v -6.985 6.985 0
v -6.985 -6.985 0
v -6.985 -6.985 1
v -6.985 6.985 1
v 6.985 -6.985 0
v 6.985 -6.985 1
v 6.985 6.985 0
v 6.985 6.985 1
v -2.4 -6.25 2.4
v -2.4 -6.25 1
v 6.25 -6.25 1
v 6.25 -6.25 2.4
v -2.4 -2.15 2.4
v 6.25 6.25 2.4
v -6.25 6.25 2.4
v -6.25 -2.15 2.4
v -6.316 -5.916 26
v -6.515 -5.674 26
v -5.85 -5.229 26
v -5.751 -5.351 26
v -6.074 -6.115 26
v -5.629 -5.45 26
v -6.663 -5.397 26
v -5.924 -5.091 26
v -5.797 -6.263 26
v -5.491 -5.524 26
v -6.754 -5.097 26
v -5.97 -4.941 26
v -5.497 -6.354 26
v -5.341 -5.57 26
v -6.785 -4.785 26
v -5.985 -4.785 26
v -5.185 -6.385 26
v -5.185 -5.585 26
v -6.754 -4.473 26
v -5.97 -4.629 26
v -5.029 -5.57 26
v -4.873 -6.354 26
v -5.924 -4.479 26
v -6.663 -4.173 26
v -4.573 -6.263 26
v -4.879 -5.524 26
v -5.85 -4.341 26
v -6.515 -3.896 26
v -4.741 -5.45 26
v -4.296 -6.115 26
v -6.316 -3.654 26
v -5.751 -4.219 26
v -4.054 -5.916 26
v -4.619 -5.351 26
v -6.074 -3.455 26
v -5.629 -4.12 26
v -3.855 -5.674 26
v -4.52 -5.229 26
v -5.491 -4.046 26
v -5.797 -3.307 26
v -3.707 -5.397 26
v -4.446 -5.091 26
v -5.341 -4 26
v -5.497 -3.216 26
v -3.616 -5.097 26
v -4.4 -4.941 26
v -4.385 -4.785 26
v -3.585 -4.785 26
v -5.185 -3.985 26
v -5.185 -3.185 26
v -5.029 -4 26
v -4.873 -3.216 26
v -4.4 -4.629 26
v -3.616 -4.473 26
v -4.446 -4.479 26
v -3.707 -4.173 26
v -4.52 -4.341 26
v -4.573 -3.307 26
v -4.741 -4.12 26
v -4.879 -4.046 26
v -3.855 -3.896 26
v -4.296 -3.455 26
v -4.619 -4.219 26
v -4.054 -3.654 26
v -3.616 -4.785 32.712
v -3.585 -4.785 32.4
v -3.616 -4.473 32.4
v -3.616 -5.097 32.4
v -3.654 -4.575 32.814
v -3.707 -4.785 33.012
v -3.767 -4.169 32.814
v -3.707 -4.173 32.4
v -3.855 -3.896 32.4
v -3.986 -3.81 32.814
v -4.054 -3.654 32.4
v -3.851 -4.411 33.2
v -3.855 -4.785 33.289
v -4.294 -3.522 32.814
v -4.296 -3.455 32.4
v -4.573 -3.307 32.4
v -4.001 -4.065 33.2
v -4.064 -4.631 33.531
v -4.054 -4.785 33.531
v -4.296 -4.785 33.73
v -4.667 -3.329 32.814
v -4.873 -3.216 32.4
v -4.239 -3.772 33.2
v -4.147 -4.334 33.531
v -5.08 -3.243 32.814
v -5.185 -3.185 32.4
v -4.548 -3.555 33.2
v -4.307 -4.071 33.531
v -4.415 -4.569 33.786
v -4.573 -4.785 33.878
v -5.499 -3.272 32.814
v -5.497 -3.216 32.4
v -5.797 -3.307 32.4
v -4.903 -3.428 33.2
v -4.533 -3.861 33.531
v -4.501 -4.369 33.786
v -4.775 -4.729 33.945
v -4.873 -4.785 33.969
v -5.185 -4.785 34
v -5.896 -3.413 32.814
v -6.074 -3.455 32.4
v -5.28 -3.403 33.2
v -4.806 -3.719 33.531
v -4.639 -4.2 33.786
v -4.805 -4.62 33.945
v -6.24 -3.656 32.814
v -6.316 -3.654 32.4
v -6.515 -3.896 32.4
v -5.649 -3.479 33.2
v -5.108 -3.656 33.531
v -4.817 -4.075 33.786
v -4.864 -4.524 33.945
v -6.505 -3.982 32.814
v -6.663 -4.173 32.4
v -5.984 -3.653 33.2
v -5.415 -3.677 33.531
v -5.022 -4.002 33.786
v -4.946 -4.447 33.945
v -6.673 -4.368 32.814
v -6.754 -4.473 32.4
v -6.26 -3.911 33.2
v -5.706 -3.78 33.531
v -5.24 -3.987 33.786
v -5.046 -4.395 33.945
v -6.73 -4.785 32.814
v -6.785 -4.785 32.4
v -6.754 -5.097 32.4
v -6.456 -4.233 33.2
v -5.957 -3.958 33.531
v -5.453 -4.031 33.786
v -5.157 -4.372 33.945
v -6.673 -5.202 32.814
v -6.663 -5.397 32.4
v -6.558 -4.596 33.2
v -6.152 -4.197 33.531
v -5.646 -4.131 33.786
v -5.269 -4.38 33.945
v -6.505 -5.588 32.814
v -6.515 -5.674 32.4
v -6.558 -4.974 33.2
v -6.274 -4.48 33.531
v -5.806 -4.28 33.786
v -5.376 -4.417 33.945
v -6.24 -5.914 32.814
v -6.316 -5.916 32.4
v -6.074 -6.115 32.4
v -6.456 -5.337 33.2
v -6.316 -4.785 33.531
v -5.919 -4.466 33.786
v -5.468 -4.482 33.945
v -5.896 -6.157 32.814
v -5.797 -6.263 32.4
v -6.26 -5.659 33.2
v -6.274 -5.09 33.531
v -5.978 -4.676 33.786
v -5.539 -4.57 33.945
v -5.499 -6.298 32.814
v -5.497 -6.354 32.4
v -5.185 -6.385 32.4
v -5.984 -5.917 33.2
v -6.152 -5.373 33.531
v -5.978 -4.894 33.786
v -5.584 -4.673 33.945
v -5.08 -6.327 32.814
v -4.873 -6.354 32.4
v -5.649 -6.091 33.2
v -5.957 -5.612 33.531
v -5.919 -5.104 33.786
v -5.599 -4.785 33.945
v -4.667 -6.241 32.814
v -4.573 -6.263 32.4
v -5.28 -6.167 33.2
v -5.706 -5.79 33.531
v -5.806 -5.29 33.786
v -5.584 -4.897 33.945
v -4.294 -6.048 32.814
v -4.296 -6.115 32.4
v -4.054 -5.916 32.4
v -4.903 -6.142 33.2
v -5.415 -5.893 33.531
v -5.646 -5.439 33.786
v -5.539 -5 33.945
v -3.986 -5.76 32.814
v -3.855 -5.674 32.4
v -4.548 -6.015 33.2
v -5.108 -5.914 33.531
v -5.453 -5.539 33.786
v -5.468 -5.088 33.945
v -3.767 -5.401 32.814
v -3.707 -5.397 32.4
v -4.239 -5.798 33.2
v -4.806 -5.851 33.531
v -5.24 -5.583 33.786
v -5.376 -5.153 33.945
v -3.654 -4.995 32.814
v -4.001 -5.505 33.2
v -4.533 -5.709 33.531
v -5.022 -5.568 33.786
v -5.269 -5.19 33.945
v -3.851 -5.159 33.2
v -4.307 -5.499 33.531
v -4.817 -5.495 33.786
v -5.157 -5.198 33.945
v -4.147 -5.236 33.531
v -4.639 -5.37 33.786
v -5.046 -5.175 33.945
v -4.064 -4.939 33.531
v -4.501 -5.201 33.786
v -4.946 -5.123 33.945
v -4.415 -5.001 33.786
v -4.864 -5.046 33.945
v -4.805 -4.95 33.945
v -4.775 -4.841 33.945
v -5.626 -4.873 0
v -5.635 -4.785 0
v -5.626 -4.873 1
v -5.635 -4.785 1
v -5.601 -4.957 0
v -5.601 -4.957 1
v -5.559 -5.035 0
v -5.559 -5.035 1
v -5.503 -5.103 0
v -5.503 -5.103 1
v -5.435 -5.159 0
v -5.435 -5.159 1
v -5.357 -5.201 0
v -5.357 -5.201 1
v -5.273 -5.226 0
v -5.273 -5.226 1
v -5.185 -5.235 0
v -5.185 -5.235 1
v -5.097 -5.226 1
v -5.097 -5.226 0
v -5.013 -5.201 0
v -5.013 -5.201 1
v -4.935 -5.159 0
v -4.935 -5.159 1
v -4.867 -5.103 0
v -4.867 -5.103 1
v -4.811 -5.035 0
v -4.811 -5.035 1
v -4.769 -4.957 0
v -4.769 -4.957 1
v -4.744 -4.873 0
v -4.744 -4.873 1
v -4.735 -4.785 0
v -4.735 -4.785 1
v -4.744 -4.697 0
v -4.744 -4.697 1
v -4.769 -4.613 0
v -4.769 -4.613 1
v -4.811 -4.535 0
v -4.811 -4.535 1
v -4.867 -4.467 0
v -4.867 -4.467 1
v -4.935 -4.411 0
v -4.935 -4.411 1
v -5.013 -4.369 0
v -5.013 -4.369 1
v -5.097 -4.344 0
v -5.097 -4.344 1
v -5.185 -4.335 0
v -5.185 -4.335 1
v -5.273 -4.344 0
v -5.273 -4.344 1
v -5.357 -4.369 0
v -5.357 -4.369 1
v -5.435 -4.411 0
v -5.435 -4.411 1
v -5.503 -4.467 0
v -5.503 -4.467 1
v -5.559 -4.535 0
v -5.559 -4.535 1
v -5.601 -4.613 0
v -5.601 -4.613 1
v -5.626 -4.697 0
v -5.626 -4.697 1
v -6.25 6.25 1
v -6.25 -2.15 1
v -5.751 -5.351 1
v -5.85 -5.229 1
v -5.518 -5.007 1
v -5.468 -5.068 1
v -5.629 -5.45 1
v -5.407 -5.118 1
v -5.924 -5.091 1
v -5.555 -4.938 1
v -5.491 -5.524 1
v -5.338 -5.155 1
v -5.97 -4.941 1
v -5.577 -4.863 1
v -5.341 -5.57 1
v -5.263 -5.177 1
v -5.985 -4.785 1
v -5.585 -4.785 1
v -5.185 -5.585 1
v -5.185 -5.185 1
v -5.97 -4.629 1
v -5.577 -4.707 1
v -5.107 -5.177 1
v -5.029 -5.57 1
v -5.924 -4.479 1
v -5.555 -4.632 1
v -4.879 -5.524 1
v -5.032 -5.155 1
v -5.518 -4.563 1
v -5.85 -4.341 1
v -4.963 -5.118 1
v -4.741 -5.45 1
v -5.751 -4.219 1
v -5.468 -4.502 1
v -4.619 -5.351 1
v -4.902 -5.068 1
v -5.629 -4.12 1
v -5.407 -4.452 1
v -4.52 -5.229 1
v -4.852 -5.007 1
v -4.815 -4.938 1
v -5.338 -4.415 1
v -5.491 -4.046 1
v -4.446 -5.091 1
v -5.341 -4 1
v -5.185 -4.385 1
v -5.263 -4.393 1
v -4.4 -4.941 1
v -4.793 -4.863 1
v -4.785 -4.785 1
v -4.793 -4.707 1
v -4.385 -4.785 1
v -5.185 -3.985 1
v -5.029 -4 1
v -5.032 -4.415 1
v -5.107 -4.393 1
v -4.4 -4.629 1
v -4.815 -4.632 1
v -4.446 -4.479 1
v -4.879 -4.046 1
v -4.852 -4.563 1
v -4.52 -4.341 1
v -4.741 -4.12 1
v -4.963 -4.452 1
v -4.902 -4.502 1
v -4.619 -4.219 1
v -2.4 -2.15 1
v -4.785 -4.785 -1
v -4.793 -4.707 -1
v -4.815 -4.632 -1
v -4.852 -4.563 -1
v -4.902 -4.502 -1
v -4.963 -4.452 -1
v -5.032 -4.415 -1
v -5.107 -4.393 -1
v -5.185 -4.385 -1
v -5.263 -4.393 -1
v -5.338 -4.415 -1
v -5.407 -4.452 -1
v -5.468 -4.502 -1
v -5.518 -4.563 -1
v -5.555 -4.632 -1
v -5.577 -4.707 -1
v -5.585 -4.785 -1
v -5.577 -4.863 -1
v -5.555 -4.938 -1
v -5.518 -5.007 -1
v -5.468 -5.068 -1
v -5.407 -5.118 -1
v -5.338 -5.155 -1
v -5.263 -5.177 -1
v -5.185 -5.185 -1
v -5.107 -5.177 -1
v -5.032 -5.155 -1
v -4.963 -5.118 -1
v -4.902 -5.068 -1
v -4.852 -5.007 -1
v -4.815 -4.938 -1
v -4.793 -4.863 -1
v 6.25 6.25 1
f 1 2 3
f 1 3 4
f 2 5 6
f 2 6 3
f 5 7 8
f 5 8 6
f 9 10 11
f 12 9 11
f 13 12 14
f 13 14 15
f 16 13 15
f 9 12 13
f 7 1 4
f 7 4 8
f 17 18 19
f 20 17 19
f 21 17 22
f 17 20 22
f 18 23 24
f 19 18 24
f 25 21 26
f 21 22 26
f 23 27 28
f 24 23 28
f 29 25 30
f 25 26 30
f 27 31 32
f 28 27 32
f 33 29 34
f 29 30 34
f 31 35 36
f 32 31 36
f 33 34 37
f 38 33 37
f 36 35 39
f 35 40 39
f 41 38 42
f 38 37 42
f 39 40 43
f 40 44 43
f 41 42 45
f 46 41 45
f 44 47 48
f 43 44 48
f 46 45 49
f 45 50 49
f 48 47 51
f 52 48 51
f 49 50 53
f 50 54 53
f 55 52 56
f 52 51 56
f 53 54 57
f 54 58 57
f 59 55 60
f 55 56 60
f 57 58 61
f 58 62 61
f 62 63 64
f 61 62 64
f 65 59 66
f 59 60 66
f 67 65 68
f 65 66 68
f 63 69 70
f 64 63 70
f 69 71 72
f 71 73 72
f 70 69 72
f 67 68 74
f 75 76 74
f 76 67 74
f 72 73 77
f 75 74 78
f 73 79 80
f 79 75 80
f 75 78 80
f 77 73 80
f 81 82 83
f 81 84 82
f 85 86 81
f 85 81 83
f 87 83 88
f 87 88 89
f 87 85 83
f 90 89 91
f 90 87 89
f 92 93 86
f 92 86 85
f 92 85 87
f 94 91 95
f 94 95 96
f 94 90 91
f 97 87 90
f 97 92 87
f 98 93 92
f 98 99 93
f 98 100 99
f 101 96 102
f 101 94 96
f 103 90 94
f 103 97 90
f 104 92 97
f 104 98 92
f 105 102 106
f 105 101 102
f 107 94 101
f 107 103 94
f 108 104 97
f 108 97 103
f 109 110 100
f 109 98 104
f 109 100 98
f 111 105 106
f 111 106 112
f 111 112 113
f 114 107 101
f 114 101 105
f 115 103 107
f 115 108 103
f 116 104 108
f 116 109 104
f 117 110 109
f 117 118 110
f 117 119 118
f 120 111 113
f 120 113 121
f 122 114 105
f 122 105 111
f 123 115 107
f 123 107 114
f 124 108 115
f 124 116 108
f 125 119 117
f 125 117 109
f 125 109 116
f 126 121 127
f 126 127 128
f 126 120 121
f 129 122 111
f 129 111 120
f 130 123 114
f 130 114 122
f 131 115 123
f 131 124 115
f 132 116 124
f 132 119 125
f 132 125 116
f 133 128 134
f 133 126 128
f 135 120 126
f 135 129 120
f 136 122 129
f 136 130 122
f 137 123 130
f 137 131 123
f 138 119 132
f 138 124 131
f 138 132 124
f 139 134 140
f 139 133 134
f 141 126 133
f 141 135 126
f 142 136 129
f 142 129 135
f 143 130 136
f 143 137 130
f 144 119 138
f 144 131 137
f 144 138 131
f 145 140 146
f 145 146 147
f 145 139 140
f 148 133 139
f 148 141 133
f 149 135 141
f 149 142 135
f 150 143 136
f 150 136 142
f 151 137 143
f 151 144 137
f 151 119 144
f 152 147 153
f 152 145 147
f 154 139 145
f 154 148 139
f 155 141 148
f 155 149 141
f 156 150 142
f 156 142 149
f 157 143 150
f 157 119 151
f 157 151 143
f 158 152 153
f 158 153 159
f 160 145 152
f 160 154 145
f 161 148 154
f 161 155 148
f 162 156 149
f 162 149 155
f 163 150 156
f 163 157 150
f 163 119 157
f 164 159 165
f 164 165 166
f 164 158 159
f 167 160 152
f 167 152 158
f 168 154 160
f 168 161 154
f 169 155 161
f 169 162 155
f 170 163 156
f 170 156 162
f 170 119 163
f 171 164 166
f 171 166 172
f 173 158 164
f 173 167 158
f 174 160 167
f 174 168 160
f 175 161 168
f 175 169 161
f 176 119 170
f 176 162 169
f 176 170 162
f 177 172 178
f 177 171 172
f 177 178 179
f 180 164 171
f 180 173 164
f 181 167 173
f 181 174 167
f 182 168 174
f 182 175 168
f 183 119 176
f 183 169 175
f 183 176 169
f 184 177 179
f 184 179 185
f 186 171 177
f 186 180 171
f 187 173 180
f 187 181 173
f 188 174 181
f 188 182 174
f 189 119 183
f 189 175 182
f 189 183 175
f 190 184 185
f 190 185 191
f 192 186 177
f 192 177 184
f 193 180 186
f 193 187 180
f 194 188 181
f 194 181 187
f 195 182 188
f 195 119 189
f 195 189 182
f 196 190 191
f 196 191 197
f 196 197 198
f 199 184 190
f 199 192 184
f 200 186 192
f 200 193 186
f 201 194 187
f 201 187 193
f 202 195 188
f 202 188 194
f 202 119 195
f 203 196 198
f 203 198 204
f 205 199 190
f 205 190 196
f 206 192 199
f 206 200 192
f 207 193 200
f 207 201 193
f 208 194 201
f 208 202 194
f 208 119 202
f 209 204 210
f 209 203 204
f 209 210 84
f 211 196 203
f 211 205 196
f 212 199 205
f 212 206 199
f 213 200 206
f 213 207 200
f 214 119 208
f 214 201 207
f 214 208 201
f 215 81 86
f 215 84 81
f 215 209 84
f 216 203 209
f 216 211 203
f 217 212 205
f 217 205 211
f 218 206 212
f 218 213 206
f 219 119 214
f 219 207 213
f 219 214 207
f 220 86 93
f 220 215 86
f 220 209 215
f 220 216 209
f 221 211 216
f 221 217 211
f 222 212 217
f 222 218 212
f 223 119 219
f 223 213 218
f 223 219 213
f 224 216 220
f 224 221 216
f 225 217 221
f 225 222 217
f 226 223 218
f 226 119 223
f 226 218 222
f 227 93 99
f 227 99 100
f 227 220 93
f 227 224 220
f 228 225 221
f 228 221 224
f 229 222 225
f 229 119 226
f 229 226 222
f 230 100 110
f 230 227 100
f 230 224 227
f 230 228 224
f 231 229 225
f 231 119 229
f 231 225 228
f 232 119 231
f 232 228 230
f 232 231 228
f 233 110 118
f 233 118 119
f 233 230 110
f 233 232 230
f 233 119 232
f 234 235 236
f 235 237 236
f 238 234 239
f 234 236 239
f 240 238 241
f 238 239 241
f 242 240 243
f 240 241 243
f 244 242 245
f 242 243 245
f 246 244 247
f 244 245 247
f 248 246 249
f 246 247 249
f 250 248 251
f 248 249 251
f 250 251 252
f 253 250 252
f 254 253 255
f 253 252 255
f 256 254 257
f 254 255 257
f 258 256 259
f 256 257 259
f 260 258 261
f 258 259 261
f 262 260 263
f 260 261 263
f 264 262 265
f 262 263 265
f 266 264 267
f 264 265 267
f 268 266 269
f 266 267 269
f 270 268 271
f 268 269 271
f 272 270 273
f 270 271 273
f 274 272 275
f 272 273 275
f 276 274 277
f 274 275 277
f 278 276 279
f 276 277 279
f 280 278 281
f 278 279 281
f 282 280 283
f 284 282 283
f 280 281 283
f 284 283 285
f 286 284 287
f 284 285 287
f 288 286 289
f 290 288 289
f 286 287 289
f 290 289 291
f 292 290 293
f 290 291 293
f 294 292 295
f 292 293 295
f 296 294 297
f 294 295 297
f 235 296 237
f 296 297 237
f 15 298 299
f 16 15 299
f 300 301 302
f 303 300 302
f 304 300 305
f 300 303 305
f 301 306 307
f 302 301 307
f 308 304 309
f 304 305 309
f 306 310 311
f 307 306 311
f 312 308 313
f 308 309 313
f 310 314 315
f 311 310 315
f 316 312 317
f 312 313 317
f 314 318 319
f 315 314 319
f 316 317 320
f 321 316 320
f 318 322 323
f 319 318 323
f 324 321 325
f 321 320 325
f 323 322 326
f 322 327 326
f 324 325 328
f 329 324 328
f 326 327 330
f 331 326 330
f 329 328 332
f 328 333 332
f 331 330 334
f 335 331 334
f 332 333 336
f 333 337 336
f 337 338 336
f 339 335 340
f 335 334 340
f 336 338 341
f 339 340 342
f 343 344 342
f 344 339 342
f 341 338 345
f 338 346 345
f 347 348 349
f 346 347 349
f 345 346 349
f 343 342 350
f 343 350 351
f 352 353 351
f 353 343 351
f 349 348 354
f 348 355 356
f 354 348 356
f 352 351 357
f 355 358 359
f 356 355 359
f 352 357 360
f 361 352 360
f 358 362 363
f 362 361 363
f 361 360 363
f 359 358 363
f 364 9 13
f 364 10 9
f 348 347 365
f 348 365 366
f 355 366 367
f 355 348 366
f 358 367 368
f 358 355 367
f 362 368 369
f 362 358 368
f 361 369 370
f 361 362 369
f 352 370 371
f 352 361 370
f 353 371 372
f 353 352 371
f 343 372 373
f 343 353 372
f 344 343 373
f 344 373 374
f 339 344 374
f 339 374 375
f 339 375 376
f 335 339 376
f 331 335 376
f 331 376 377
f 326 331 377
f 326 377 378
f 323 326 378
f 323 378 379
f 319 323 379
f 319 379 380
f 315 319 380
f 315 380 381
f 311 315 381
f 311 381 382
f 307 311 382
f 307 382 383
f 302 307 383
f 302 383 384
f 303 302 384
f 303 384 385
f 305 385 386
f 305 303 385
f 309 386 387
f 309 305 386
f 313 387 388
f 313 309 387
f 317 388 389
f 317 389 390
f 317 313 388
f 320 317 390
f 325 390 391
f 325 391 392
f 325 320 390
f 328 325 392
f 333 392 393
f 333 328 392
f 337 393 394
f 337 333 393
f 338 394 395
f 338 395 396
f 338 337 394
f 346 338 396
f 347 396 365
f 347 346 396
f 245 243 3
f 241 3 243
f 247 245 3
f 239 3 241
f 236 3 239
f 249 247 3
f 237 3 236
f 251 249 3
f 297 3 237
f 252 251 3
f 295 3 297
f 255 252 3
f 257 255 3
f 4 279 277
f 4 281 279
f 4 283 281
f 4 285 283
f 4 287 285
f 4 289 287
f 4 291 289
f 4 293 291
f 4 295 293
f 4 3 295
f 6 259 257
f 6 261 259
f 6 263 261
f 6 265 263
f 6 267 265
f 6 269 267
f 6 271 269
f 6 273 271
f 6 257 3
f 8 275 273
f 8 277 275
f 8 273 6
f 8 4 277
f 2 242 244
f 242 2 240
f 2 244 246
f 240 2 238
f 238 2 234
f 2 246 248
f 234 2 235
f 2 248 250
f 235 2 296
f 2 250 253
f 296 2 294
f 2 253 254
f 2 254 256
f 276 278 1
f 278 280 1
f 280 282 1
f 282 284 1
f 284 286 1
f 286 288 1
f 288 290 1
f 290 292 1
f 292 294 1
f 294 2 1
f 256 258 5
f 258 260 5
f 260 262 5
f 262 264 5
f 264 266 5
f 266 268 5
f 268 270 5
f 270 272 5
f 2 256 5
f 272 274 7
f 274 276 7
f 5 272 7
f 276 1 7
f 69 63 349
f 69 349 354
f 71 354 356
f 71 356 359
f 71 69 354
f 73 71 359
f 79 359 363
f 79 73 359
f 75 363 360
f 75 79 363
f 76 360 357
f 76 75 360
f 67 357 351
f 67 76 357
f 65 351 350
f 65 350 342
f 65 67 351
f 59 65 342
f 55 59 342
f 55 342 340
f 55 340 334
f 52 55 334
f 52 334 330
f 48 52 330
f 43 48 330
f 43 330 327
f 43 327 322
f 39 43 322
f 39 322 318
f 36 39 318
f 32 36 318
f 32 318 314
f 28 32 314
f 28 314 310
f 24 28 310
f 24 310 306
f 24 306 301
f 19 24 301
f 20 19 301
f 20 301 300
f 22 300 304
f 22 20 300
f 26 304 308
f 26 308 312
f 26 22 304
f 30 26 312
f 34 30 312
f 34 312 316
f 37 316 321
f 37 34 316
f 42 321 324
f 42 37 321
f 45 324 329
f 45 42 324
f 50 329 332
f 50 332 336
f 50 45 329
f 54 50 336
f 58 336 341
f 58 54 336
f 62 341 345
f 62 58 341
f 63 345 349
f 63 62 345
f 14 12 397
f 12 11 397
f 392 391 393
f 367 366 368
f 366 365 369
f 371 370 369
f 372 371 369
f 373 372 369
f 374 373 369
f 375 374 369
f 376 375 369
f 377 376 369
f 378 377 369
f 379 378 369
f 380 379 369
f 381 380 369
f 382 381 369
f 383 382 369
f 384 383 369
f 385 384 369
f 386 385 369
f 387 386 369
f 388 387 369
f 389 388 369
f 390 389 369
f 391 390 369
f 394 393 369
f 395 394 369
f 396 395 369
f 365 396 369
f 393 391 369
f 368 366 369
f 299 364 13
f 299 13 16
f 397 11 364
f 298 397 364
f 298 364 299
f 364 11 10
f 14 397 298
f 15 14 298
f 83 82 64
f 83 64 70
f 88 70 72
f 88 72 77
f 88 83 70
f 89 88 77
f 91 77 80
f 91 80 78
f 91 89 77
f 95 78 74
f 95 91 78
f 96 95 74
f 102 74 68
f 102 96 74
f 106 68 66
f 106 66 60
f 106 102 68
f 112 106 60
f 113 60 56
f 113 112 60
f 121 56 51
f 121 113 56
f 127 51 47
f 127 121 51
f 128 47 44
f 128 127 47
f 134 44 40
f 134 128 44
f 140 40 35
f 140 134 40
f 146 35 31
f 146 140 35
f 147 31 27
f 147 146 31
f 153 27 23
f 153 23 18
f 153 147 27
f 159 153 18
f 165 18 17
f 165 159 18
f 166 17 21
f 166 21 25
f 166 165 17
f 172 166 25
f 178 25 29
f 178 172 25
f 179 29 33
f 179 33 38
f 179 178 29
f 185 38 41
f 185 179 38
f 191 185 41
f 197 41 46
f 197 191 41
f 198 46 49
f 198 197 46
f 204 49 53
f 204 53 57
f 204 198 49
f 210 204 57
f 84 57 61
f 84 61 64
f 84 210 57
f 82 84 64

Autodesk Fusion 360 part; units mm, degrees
sketch "スケッチ1" plane through (0, 0, 0) normal (0, 0, 1) x (1, 0, 0)
  line L0 (6.985, -6.985) -> (-6.985, -6.985)
  line L1 (-6.985, -6.985) -> (-6.985, 6.985)
  line L2 (-6.985, 6.985) -> (6.985, 6.985)
  line L3 (6.985, 6.985) -> (6.985, -6.985)
  line L4 (6.985, -6.985) -> (-6.985, 6.985) construction
  line L5 (-6.985, -6.985) -> (6.985, 6.985) construction
  dimension "d1" = 13.97
  dimension "d2" = 13.97
extrude "押し出し1" add sketch "スケッチ1" along normal blind 1 makes body 1
sketch "スケッチ2" plane through (0, 0, 1) normal (0, 0, 1) x (-1, 0, 0)
  line L0 (-6.985, -6.985) -> (6.985, -6.985)
  line L1 (6.985, -6.985) -> (6.985, 6.985)
  line L2 (6.985, 6.985) -> (-6.985, 6.985)
  line L3 (-6.985, 6.985) -> (-6.985, -6.985)
  line L4 (-6.25, -6.25) -> (6.25, -6.25)
  line L5 (6.25, -6.25) -> (6.25, 6.25)
  line L6 (6.25, 6.25) -> (-6.25, 6.25)
  line L7 (-6.25, 6.25) -> (-6.25, -6.25)
  line L8 (-6.25, -6.25) -> (6.25, 6.25) construction
  line L9 (6.25, -6.25) -> (-6.25, 6.25) construction
  circle A0 centre (5.185, 4.785) radius 0.45
  line L10 (6.25, -6.25) -> (6.25, 2.15)
  line L11 (-6.25, 6.25) -> (2.4, 6.25)
  line L12 (2.4, 6.25) -> (2.4, 2.15)
  line L13 (2.4, 2.15) -> (6.25, 2.15)
  dimension "d20" = 12.5
  dimension "d21" = 12.5
  dimension "d24" = 0.9
  dimension "d25" = 8.4
  dimension "d26" = 8.65
extrude "押し出し2" add sketch "スケッチ2" along normal blind 1.4 separate body contours L4 L5 L6 L7 L10 L11 L12 L13 makes body 2
extrude "押し出し3" cut sketch "スケッチ2" against normal blind 1 contours A0 bodies 1
cylinder "円柱プリミティブ1" add diameter 0.8 height 2 placed x (1, 0, 0) y (0, 1, 0) z (0, 0, 1) at (11, 0, 0) separate body makes body 3
cylinder "円柱プリミティブ2" add diameter 1.6 height 25 placed x (1, 0, 0) y (0, 1, 0) z (0, 0, 1) at (11, 0, 2) bodies 3
cylinder "円柱プリミティブ3" add diameter 3.2 height 8 placed x (1, 0, 0) y (0, 1, 0) z (0, 0, 1) at (11, 0, 27) bodies 3
fillet "フィレット1" radius 1.6 1 edges at (9.5083, -0.5786, 35) on bodies 3
copy_body "ボディ -> コンポーネント1" bodies 3 removing the originals makes body 4 in component "アンテナ"
component "アンテナ" placed x (1, 0, 0) y (0, 1, 0) z (0, 0, 1) at (-16.185, -4.785, -1)
